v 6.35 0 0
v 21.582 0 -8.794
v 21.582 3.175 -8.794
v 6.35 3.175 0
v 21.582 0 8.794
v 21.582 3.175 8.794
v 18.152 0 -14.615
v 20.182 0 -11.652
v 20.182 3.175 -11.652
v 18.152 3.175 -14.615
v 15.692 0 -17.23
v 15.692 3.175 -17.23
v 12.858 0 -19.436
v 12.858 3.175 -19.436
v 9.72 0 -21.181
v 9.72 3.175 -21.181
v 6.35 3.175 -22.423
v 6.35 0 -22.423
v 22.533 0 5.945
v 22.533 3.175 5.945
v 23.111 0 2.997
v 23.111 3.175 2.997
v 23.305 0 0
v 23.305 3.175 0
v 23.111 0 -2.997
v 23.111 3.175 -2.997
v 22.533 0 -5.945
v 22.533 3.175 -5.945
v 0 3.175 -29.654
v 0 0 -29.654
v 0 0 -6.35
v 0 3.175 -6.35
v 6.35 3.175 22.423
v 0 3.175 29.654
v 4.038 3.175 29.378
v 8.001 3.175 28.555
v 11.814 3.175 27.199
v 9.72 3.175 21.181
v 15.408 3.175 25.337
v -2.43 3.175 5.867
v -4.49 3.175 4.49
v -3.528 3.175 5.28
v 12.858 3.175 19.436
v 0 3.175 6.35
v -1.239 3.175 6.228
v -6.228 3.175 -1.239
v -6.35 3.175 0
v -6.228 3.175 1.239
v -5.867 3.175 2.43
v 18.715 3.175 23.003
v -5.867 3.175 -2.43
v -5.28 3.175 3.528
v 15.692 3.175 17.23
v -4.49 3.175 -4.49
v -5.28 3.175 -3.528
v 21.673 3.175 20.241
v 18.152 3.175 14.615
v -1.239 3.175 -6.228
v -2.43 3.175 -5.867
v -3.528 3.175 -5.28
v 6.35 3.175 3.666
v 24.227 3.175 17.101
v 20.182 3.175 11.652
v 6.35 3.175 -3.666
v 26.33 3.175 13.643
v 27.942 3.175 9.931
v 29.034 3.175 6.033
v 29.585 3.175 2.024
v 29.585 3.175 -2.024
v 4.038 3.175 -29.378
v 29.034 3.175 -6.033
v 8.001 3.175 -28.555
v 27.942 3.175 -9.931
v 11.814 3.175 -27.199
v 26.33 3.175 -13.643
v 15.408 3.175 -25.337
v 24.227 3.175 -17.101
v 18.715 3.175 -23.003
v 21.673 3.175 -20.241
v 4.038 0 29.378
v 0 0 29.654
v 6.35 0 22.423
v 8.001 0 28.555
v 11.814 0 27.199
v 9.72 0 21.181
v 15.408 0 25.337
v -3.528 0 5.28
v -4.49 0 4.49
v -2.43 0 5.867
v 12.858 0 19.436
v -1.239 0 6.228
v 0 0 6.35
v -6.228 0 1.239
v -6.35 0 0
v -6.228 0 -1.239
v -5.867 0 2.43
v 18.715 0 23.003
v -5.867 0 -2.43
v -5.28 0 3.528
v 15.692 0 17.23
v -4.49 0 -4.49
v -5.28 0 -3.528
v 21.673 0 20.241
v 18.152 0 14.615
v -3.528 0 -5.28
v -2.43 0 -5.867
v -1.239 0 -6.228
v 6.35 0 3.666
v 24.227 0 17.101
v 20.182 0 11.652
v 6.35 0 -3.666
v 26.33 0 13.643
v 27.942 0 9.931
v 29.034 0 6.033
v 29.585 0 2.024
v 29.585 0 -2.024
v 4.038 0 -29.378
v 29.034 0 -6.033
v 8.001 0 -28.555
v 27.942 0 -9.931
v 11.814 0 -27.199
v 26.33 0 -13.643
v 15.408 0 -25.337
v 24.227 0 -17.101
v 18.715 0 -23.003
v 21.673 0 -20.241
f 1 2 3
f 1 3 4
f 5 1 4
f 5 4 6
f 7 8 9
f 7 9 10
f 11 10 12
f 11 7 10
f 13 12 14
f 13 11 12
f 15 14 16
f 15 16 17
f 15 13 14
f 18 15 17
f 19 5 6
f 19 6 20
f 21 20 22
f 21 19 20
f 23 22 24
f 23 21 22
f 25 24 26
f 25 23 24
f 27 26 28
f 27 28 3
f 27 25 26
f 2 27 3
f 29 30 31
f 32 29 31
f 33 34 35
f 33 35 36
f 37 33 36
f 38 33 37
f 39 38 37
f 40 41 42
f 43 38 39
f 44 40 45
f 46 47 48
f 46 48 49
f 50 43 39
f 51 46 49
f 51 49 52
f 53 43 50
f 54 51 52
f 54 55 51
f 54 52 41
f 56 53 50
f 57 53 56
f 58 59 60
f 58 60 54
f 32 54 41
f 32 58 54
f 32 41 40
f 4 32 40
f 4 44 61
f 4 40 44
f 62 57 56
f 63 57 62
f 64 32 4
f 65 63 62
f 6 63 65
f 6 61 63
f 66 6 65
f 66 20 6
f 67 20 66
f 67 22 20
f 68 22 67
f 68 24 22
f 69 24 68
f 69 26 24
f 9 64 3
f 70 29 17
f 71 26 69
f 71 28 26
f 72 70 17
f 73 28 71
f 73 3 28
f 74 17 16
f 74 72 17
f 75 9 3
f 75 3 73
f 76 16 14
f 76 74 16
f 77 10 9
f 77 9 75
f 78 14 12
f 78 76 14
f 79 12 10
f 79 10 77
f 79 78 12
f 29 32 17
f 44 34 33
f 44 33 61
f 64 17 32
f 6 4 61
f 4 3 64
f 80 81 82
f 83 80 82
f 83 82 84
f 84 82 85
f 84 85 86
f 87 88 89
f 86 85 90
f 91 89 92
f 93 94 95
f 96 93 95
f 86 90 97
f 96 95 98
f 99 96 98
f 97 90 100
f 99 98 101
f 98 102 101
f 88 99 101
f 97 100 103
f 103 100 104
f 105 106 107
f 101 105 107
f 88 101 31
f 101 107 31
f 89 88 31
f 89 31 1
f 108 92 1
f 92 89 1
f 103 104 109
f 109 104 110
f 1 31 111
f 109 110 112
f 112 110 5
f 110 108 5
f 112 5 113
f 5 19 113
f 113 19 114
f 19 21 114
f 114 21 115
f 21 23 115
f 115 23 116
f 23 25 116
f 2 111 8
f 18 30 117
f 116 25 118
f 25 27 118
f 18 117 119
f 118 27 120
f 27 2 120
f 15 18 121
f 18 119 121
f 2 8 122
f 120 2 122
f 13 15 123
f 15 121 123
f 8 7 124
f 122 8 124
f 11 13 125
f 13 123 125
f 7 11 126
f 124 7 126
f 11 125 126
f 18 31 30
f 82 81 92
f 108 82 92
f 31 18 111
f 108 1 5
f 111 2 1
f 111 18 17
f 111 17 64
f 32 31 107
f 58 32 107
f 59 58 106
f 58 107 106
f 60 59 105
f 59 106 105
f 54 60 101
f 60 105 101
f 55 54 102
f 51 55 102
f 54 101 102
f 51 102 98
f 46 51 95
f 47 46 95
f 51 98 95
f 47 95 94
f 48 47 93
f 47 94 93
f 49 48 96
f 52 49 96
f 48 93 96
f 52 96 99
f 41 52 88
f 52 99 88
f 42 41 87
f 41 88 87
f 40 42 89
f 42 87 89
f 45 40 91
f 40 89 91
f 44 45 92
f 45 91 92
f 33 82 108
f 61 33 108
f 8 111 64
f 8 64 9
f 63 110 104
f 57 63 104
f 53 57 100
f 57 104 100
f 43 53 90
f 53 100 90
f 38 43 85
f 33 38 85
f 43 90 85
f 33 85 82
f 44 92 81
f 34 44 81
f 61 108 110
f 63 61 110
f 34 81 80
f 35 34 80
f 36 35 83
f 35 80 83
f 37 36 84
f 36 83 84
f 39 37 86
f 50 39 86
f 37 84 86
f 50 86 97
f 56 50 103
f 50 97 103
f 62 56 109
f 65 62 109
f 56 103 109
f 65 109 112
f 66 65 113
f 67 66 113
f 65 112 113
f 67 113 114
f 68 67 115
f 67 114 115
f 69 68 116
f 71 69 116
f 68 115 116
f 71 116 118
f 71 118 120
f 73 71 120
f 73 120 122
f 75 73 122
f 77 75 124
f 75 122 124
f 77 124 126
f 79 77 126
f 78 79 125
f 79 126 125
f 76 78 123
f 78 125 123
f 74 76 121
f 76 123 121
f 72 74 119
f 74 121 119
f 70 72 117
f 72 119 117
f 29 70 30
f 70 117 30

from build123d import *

# Parameters (mm, degrees)
BOSS_EXTRUDE1_DEPTH = 3.175


with BuildPart() as part:
    # Sketch1 → Boss-Extrude1 (new body)
    with BuildSketch(Plane(origin=(0, 0, 0), x_dir=(1, 0, 0), z_dir=(0, 1, 0))):
        with BuildLine():
            Line((0, 29.6545), (0, 6.35))
            ThreePointArc((0, 6.35), (-6.35, 0), (0, -6.35))
            Line((0, -6.35), (0, -29.6545))
            ThreePointArc((0, -29.6545), (29.6545, 0), (0, 29.6545))
        make_face()
        with BuildLine():
            Line((6.35, 22.422694313), (6.35, 3.666174209))
            Line((6.35, 3.666174209), (20.182289022, 11.65225))
            ThreePointArc((20.182289022, 11.65225), (14.317514025, 18.387727222), (6.35, 22.422694313))
        make_face(mode=Mode.SUBTRACT)
        with BuildLine():
            Line((6.35, 0), (21.581607168, -8.793972499))
            ThreePointArc((21.581607168, -8.793972499), (23.3045, 0), (21.581607168, 8.793972499))
            Line((21.581607168, 8.793972499), (6.35, 0))
        make_face(mode=Mode.SUBTRACT)
        with BuildLine():
            Line((6.35, -3.666174209), (20.182289022, -11.65225))
            ThreePointArc((20.182289022, -11.65225), (14.317514025, -18.387727222), (6.35, -22.422694313))
            Line((6.35, -22.422694313), (6.35, -3.666174209))
        make_face(mode=Mode.SUBTRACT)
    extrude(amount=BOSS_EXTRUDE1_DEPTH)


solid = part.part
